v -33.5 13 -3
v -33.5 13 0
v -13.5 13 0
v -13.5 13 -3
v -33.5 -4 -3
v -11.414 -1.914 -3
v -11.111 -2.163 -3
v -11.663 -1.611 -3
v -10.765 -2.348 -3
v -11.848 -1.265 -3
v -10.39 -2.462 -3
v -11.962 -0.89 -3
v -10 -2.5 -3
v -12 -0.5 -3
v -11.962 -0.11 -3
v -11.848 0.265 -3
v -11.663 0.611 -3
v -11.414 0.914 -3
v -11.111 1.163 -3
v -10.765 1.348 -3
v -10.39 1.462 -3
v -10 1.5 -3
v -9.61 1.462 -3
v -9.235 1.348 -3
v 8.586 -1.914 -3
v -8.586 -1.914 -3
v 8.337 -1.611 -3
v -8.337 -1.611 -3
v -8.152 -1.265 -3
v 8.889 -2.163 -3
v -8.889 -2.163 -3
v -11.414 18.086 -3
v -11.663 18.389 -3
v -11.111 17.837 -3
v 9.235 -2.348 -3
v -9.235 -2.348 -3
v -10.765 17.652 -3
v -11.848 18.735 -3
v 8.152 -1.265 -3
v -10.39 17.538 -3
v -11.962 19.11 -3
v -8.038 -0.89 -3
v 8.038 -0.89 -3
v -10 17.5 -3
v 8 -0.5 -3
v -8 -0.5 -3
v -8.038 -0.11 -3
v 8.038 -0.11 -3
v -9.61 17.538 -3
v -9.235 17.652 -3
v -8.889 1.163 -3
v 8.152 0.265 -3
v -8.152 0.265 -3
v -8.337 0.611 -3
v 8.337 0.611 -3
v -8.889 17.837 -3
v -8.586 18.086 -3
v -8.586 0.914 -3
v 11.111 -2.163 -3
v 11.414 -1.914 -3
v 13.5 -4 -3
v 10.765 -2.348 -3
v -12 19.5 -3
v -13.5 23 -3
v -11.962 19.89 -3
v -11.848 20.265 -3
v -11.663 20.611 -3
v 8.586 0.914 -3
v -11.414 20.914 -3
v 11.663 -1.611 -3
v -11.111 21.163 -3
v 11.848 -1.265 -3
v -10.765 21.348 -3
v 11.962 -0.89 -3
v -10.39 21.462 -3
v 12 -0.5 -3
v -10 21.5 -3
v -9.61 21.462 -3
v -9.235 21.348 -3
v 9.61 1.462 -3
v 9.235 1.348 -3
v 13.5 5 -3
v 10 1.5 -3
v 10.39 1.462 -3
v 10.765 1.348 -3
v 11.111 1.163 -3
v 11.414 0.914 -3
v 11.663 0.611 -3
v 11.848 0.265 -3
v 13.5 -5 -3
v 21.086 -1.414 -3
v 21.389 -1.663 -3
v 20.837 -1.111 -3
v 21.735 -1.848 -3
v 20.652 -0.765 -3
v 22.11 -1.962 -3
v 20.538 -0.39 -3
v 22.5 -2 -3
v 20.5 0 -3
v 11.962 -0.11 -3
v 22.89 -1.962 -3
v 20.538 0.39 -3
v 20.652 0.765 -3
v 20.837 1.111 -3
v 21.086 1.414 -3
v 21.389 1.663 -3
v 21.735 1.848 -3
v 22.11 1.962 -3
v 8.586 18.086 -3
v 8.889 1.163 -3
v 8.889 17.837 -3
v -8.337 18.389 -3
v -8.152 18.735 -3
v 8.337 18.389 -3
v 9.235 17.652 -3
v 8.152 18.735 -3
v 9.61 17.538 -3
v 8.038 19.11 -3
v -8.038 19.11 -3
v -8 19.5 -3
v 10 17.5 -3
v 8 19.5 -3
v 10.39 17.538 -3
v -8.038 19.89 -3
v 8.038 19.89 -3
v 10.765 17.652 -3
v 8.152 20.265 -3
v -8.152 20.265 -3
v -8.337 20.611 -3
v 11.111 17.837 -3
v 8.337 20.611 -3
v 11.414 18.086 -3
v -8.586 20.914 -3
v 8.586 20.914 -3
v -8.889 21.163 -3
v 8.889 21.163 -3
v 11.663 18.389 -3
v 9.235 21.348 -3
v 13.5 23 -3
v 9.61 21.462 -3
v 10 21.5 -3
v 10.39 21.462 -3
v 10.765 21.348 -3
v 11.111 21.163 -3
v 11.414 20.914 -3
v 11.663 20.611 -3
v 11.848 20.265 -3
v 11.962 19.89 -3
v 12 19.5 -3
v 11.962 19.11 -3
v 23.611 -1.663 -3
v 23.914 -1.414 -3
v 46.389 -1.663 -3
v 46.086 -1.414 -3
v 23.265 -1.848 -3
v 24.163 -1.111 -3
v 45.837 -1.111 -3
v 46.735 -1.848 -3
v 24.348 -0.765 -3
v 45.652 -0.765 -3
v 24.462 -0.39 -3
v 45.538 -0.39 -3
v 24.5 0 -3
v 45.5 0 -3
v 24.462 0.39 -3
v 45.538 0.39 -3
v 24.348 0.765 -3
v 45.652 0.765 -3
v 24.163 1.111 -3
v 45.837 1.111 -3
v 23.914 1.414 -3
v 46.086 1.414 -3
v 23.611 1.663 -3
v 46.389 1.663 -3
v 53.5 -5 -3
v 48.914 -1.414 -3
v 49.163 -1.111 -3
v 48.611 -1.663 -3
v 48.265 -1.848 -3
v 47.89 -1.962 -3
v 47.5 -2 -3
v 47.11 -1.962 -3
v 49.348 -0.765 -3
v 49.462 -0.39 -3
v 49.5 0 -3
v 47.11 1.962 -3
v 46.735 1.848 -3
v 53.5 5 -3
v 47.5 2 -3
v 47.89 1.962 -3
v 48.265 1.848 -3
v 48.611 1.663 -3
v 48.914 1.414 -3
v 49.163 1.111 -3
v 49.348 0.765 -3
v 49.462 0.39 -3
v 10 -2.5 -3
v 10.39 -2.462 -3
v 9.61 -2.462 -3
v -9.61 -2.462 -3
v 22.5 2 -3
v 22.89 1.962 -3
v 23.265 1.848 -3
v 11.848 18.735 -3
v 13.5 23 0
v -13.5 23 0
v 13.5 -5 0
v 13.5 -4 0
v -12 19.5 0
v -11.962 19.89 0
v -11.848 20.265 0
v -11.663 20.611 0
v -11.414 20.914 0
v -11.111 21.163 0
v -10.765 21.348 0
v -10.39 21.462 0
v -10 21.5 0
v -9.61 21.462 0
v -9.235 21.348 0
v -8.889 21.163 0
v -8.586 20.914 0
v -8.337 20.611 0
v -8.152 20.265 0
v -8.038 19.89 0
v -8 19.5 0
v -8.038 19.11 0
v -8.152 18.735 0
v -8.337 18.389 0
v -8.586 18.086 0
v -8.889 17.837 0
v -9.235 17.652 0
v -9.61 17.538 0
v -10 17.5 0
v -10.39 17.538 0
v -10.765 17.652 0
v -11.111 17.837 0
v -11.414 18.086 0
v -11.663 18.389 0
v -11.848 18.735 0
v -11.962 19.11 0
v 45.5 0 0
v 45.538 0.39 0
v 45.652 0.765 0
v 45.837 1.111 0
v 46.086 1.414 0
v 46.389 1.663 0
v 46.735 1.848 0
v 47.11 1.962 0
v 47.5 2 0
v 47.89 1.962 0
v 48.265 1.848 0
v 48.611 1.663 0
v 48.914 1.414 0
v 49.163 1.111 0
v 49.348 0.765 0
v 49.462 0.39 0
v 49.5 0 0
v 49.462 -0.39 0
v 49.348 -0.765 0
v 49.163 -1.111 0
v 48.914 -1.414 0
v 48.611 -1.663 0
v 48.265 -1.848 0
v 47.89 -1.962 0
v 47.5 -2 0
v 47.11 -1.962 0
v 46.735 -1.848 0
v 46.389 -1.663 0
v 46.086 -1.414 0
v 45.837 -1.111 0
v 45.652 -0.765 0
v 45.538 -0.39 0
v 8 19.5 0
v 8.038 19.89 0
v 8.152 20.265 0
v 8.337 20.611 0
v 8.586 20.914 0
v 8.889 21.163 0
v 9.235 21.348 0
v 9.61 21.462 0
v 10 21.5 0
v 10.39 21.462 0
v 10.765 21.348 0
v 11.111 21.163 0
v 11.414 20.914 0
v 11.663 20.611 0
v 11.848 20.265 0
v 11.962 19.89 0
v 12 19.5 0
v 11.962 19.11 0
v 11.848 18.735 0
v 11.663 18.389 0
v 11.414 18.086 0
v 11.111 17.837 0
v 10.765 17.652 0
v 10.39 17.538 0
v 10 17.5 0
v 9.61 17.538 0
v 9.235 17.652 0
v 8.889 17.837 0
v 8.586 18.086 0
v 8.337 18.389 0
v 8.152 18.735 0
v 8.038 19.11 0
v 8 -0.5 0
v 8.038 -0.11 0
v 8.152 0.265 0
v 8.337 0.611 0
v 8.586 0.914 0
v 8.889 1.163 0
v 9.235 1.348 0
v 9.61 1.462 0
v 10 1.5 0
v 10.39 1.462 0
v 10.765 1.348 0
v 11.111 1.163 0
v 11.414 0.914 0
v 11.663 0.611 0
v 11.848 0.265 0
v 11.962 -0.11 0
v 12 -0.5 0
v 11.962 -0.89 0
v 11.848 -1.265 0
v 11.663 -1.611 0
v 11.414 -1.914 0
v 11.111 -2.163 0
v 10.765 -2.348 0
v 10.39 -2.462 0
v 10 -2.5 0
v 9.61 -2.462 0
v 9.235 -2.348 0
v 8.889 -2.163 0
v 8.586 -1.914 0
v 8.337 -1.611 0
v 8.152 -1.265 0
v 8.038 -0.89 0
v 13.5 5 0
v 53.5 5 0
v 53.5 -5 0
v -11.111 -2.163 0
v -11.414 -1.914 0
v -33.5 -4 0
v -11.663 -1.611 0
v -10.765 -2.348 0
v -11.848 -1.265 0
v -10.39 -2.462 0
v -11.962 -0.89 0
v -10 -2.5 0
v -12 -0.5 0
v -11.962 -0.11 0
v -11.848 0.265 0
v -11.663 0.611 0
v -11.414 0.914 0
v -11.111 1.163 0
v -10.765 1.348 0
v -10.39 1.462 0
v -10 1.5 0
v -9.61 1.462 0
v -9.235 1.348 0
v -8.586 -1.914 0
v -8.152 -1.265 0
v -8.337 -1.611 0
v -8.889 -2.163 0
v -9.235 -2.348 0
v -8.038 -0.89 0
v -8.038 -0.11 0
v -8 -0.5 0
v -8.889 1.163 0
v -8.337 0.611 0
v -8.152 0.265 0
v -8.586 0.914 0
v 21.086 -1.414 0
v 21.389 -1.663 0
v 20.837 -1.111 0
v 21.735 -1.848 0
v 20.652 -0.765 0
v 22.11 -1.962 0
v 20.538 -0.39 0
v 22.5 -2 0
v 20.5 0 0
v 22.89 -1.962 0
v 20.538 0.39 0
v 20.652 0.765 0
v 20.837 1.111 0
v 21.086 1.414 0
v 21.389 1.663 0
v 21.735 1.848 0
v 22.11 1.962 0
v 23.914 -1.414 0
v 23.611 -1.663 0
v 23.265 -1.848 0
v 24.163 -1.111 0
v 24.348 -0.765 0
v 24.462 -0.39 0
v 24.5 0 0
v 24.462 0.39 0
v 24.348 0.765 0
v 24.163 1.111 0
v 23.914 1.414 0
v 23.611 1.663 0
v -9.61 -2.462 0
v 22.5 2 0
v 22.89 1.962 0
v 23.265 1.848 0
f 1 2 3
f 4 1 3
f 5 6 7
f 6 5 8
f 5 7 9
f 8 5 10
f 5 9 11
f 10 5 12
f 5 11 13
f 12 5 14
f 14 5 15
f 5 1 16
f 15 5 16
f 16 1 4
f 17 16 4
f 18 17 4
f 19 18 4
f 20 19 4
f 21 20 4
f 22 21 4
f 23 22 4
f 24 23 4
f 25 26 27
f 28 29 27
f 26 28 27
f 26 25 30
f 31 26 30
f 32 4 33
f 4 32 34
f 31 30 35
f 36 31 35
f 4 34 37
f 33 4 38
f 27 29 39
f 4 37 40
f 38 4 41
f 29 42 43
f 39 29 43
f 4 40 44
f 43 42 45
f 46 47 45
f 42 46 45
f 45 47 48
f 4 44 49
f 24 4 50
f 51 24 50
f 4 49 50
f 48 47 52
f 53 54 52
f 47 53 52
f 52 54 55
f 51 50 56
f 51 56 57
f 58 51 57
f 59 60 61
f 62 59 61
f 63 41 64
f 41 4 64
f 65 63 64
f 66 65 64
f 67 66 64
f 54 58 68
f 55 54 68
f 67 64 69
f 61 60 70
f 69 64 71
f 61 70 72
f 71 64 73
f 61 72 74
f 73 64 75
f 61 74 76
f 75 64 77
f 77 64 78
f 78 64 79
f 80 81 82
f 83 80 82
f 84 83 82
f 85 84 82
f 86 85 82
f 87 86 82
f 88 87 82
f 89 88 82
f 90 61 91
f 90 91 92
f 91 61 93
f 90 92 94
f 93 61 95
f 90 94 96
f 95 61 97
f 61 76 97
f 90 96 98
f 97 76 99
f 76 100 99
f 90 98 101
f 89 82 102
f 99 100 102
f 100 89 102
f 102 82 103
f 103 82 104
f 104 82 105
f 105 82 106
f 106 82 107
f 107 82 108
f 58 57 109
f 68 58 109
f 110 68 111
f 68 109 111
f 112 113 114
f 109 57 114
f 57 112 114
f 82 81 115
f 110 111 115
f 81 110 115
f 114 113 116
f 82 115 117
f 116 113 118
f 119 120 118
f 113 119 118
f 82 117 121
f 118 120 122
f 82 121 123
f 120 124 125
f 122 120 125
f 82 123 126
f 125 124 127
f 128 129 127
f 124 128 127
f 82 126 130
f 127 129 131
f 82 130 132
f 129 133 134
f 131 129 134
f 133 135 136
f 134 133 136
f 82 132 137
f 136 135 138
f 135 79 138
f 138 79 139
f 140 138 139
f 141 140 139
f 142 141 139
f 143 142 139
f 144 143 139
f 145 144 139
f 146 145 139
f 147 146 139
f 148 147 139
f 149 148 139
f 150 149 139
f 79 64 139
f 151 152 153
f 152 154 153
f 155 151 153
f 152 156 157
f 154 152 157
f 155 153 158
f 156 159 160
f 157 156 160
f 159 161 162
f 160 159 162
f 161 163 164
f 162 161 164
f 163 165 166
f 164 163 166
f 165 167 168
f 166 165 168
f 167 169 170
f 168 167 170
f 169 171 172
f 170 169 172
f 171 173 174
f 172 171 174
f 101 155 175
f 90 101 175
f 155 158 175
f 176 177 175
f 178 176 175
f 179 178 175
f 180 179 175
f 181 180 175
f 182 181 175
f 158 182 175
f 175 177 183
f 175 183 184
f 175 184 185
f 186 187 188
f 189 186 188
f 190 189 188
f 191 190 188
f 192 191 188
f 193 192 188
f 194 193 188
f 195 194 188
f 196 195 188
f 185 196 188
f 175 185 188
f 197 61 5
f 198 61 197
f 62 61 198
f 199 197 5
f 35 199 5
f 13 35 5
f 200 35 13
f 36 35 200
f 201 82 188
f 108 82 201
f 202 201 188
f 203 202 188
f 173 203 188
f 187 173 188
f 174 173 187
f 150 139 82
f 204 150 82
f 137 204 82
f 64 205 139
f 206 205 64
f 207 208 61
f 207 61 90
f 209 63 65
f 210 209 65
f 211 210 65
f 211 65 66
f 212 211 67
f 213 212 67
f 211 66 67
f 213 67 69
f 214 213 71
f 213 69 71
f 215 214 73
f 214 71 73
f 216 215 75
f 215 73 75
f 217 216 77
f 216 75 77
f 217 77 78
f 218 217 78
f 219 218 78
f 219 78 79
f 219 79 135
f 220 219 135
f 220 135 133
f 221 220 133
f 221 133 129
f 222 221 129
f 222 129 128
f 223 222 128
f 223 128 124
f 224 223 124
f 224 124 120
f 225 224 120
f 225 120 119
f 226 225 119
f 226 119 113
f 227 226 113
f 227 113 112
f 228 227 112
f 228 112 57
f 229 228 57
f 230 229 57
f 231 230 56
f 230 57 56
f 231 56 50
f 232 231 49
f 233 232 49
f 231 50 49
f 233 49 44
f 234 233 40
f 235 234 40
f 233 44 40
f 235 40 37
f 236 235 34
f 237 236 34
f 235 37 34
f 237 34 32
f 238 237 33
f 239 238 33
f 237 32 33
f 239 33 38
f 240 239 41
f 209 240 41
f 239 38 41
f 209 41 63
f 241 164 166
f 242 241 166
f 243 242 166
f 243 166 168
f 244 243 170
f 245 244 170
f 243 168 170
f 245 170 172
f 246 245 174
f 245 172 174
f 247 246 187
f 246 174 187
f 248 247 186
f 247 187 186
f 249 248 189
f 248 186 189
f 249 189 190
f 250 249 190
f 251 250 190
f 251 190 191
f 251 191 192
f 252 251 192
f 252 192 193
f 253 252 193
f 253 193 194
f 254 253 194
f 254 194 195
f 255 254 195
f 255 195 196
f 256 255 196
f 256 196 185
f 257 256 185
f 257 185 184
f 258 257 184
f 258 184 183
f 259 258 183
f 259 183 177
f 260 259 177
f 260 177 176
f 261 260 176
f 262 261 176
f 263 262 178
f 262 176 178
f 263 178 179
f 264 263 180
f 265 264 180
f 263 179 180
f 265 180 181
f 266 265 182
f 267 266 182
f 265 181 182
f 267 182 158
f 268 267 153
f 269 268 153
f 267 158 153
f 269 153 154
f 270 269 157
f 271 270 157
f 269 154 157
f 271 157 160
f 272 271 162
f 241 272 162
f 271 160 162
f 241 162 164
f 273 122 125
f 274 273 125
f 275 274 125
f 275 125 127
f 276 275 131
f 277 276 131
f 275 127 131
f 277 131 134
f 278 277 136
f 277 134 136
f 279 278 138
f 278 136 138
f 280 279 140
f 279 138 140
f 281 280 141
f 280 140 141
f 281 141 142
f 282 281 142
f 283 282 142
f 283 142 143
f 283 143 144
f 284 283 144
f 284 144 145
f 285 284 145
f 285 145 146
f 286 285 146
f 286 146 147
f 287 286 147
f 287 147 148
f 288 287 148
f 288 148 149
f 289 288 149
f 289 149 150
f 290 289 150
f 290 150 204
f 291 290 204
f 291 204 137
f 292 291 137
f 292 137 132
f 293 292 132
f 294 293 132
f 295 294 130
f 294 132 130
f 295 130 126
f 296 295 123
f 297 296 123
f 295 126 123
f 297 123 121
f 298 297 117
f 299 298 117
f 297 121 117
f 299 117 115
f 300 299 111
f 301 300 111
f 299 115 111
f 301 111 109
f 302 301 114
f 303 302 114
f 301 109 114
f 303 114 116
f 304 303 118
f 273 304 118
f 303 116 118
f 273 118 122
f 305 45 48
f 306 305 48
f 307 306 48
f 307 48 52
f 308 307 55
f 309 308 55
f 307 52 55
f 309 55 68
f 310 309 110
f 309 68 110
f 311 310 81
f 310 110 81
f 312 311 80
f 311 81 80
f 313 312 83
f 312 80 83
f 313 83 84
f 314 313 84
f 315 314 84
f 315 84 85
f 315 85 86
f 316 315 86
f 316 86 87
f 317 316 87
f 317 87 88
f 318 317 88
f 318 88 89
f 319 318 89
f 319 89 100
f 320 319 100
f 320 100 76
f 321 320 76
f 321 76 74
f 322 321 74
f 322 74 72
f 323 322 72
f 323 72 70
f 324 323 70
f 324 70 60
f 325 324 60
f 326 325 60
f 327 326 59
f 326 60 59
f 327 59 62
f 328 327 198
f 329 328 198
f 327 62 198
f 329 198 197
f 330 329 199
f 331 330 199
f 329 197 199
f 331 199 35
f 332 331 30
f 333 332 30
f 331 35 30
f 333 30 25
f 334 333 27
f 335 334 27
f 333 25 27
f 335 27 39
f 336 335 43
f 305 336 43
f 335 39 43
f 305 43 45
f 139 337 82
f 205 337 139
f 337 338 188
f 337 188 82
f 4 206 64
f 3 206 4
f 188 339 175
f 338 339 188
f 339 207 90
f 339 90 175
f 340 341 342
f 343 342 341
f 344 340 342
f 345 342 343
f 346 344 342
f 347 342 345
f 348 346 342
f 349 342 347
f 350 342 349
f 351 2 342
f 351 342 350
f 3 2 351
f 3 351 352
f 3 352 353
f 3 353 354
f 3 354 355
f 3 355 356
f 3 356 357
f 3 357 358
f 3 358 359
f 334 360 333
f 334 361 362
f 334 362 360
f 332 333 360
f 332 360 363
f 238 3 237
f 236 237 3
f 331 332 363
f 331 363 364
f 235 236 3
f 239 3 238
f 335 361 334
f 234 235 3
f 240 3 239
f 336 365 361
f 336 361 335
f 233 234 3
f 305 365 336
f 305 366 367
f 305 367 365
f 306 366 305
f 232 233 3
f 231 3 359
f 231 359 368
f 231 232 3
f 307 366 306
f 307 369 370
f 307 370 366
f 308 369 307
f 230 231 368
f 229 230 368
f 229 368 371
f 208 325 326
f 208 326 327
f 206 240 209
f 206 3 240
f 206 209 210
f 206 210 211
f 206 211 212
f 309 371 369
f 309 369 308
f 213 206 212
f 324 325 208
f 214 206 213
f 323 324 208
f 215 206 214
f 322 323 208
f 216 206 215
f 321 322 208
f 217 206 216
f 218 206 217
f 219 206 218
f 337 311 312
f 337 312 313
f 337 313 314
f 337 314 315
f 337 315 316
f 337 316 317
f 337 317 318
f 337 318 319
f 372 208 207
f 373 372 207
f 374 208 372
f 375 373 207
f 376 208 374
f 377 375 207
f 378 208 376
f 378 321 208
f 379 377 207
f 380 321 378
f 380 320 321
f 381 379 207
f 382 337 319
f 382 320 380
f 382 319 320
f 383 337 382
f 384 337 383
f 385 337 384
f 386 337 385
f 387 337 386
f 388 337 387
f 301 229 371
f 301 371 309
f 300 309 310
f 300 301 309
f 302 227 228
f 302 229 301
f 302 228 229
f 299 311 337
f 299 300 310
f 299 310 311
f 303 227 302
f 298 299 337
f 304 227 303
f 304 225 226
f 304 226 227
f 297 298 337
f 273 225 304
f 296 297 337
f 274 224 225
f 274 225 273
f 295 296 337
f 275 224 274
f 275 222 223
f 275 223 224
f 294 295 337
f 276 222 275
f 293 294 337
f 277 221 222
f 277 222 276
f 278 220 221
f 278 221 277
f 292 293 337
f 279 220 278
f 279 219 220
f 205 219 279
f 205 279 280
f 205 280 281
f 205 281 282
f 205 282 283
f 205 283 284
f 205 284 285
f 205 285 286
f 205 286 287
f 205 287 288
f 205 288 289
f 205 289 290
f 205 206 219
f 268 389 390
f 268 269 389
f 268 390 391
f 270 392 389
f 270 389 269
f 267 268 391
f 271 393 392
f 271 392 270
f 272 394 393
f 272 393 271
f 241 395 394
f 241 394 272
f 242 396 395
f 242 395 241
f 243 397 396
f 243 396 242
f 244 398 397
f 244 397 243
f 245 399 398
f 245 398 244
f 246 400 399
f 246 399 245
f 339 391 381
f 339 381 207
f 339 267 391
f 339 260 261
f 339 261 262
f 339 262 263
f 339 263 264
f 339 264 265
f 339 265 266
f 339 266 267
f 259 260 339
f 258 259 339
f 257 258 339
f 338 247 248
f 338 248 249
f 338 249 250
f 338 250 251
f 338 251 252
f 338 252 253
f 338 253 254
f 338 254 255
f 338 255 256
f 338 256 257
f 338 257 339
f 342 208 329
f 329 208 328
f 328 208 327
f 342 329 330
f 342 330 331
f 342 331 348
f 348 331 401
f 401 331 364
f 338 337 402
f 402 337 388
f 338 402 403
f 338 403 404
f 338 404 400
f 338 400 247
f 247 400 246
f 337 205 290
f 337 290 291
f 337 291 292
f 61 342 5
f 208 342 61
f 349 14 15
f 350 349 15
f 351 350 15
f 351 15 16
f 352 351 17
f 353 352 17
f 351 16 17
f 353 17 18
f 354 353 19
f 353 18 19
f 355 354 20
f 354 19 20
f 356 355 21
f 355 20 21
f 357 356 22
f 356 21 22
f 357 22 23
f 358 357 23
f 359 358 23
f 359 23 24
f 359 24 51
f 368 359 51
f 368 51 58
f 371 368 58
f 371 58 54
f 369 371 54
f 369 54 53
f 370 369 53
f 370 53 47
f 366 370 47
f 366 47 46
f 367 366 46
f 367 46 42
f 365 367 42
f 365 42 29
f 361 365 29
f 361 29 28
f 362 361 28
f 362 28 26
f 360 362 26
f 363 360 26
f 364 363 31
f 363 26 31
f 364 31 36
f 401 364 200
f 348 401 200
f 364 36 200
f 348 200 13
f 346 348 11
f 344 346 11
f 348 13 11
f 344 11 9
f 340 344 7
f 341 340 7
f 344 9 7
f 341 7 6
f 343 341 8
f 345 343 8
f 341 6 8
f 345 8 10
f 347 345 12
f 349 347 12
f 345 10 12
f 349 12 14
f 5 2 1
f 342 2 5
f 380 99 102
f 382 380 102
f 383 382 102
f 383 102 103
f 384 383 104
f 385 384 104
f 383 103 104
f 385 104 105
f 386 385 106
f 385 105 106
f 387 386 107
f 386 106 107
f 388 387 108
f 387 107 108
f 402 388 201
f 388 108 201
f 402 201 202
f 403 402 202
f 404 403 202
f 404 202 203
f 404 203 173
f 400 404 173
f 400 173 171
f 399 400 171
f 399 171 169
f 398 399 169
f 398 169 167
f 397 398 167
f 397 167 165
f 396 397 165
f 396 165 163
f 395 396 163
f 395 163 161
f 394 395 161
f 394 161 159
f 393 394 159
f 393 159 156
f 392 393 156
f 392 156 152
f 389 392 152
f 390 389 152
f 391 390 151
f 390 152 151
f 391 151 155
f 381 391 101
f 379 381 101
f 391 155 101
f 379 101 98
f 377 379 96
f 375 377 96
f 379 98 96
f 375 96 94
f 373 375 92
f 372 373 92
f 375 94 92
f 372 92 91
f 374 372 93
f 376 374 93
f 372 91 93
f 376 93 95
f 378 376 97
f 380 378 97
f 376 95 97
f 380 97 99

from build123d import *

# Parameters (mm, degrees)
F0_W     = 20
F0_H     = 20
F1_DEPTH = 3
F2_D     = 4
F0_H_2   = 7
F0_H_3   = 10
F3_DEPTH = 3


with BuildPart() as f1:
    # F0 (on Top) → F1 (new body)
    with BuildSketch(Plane.XY):
        Polygon((-13.5, -4), (13.5, -4), (13.5, 5), (13.5, 23), (-13.5, 23), (-13.5, 13), (-13.5, 6), align=None)
        with Locations((0, 9.5)):
            Rectangle(F0_W, F0_H, mode=Mode.SUBTRACT)
        with Locations((0, 9.5)):
            Rectangle(F0_W, F0_H)
        Polygon((13.5, 5), (13.5, -4), (13.5, -5), (53.5, -5), (53.5, 5), align=None)
    extrude(amount=-F1_DEPTH)

    # F2 (through all)
    with Locations(Plane.XY):
        with Locations((-10, -0.5), (-10, 19.5), (10, -0.5), (22.5, 0), (47.5, 0), (10, 19.5)):
            Hole(F2_D / 2)

    # F0 (on Top) → F3 (join)
    with BuildSketch(Plane.XY):
        with Locations((-23.5, 9.5)):
            Rectangle(F0_W, F0_H_2)
        with Locations((-23.5, 1)):
            Rectangle(F0_W, F0_H_3)
    extrude(amount=-F3_DEPTH)


solid = f1.part
